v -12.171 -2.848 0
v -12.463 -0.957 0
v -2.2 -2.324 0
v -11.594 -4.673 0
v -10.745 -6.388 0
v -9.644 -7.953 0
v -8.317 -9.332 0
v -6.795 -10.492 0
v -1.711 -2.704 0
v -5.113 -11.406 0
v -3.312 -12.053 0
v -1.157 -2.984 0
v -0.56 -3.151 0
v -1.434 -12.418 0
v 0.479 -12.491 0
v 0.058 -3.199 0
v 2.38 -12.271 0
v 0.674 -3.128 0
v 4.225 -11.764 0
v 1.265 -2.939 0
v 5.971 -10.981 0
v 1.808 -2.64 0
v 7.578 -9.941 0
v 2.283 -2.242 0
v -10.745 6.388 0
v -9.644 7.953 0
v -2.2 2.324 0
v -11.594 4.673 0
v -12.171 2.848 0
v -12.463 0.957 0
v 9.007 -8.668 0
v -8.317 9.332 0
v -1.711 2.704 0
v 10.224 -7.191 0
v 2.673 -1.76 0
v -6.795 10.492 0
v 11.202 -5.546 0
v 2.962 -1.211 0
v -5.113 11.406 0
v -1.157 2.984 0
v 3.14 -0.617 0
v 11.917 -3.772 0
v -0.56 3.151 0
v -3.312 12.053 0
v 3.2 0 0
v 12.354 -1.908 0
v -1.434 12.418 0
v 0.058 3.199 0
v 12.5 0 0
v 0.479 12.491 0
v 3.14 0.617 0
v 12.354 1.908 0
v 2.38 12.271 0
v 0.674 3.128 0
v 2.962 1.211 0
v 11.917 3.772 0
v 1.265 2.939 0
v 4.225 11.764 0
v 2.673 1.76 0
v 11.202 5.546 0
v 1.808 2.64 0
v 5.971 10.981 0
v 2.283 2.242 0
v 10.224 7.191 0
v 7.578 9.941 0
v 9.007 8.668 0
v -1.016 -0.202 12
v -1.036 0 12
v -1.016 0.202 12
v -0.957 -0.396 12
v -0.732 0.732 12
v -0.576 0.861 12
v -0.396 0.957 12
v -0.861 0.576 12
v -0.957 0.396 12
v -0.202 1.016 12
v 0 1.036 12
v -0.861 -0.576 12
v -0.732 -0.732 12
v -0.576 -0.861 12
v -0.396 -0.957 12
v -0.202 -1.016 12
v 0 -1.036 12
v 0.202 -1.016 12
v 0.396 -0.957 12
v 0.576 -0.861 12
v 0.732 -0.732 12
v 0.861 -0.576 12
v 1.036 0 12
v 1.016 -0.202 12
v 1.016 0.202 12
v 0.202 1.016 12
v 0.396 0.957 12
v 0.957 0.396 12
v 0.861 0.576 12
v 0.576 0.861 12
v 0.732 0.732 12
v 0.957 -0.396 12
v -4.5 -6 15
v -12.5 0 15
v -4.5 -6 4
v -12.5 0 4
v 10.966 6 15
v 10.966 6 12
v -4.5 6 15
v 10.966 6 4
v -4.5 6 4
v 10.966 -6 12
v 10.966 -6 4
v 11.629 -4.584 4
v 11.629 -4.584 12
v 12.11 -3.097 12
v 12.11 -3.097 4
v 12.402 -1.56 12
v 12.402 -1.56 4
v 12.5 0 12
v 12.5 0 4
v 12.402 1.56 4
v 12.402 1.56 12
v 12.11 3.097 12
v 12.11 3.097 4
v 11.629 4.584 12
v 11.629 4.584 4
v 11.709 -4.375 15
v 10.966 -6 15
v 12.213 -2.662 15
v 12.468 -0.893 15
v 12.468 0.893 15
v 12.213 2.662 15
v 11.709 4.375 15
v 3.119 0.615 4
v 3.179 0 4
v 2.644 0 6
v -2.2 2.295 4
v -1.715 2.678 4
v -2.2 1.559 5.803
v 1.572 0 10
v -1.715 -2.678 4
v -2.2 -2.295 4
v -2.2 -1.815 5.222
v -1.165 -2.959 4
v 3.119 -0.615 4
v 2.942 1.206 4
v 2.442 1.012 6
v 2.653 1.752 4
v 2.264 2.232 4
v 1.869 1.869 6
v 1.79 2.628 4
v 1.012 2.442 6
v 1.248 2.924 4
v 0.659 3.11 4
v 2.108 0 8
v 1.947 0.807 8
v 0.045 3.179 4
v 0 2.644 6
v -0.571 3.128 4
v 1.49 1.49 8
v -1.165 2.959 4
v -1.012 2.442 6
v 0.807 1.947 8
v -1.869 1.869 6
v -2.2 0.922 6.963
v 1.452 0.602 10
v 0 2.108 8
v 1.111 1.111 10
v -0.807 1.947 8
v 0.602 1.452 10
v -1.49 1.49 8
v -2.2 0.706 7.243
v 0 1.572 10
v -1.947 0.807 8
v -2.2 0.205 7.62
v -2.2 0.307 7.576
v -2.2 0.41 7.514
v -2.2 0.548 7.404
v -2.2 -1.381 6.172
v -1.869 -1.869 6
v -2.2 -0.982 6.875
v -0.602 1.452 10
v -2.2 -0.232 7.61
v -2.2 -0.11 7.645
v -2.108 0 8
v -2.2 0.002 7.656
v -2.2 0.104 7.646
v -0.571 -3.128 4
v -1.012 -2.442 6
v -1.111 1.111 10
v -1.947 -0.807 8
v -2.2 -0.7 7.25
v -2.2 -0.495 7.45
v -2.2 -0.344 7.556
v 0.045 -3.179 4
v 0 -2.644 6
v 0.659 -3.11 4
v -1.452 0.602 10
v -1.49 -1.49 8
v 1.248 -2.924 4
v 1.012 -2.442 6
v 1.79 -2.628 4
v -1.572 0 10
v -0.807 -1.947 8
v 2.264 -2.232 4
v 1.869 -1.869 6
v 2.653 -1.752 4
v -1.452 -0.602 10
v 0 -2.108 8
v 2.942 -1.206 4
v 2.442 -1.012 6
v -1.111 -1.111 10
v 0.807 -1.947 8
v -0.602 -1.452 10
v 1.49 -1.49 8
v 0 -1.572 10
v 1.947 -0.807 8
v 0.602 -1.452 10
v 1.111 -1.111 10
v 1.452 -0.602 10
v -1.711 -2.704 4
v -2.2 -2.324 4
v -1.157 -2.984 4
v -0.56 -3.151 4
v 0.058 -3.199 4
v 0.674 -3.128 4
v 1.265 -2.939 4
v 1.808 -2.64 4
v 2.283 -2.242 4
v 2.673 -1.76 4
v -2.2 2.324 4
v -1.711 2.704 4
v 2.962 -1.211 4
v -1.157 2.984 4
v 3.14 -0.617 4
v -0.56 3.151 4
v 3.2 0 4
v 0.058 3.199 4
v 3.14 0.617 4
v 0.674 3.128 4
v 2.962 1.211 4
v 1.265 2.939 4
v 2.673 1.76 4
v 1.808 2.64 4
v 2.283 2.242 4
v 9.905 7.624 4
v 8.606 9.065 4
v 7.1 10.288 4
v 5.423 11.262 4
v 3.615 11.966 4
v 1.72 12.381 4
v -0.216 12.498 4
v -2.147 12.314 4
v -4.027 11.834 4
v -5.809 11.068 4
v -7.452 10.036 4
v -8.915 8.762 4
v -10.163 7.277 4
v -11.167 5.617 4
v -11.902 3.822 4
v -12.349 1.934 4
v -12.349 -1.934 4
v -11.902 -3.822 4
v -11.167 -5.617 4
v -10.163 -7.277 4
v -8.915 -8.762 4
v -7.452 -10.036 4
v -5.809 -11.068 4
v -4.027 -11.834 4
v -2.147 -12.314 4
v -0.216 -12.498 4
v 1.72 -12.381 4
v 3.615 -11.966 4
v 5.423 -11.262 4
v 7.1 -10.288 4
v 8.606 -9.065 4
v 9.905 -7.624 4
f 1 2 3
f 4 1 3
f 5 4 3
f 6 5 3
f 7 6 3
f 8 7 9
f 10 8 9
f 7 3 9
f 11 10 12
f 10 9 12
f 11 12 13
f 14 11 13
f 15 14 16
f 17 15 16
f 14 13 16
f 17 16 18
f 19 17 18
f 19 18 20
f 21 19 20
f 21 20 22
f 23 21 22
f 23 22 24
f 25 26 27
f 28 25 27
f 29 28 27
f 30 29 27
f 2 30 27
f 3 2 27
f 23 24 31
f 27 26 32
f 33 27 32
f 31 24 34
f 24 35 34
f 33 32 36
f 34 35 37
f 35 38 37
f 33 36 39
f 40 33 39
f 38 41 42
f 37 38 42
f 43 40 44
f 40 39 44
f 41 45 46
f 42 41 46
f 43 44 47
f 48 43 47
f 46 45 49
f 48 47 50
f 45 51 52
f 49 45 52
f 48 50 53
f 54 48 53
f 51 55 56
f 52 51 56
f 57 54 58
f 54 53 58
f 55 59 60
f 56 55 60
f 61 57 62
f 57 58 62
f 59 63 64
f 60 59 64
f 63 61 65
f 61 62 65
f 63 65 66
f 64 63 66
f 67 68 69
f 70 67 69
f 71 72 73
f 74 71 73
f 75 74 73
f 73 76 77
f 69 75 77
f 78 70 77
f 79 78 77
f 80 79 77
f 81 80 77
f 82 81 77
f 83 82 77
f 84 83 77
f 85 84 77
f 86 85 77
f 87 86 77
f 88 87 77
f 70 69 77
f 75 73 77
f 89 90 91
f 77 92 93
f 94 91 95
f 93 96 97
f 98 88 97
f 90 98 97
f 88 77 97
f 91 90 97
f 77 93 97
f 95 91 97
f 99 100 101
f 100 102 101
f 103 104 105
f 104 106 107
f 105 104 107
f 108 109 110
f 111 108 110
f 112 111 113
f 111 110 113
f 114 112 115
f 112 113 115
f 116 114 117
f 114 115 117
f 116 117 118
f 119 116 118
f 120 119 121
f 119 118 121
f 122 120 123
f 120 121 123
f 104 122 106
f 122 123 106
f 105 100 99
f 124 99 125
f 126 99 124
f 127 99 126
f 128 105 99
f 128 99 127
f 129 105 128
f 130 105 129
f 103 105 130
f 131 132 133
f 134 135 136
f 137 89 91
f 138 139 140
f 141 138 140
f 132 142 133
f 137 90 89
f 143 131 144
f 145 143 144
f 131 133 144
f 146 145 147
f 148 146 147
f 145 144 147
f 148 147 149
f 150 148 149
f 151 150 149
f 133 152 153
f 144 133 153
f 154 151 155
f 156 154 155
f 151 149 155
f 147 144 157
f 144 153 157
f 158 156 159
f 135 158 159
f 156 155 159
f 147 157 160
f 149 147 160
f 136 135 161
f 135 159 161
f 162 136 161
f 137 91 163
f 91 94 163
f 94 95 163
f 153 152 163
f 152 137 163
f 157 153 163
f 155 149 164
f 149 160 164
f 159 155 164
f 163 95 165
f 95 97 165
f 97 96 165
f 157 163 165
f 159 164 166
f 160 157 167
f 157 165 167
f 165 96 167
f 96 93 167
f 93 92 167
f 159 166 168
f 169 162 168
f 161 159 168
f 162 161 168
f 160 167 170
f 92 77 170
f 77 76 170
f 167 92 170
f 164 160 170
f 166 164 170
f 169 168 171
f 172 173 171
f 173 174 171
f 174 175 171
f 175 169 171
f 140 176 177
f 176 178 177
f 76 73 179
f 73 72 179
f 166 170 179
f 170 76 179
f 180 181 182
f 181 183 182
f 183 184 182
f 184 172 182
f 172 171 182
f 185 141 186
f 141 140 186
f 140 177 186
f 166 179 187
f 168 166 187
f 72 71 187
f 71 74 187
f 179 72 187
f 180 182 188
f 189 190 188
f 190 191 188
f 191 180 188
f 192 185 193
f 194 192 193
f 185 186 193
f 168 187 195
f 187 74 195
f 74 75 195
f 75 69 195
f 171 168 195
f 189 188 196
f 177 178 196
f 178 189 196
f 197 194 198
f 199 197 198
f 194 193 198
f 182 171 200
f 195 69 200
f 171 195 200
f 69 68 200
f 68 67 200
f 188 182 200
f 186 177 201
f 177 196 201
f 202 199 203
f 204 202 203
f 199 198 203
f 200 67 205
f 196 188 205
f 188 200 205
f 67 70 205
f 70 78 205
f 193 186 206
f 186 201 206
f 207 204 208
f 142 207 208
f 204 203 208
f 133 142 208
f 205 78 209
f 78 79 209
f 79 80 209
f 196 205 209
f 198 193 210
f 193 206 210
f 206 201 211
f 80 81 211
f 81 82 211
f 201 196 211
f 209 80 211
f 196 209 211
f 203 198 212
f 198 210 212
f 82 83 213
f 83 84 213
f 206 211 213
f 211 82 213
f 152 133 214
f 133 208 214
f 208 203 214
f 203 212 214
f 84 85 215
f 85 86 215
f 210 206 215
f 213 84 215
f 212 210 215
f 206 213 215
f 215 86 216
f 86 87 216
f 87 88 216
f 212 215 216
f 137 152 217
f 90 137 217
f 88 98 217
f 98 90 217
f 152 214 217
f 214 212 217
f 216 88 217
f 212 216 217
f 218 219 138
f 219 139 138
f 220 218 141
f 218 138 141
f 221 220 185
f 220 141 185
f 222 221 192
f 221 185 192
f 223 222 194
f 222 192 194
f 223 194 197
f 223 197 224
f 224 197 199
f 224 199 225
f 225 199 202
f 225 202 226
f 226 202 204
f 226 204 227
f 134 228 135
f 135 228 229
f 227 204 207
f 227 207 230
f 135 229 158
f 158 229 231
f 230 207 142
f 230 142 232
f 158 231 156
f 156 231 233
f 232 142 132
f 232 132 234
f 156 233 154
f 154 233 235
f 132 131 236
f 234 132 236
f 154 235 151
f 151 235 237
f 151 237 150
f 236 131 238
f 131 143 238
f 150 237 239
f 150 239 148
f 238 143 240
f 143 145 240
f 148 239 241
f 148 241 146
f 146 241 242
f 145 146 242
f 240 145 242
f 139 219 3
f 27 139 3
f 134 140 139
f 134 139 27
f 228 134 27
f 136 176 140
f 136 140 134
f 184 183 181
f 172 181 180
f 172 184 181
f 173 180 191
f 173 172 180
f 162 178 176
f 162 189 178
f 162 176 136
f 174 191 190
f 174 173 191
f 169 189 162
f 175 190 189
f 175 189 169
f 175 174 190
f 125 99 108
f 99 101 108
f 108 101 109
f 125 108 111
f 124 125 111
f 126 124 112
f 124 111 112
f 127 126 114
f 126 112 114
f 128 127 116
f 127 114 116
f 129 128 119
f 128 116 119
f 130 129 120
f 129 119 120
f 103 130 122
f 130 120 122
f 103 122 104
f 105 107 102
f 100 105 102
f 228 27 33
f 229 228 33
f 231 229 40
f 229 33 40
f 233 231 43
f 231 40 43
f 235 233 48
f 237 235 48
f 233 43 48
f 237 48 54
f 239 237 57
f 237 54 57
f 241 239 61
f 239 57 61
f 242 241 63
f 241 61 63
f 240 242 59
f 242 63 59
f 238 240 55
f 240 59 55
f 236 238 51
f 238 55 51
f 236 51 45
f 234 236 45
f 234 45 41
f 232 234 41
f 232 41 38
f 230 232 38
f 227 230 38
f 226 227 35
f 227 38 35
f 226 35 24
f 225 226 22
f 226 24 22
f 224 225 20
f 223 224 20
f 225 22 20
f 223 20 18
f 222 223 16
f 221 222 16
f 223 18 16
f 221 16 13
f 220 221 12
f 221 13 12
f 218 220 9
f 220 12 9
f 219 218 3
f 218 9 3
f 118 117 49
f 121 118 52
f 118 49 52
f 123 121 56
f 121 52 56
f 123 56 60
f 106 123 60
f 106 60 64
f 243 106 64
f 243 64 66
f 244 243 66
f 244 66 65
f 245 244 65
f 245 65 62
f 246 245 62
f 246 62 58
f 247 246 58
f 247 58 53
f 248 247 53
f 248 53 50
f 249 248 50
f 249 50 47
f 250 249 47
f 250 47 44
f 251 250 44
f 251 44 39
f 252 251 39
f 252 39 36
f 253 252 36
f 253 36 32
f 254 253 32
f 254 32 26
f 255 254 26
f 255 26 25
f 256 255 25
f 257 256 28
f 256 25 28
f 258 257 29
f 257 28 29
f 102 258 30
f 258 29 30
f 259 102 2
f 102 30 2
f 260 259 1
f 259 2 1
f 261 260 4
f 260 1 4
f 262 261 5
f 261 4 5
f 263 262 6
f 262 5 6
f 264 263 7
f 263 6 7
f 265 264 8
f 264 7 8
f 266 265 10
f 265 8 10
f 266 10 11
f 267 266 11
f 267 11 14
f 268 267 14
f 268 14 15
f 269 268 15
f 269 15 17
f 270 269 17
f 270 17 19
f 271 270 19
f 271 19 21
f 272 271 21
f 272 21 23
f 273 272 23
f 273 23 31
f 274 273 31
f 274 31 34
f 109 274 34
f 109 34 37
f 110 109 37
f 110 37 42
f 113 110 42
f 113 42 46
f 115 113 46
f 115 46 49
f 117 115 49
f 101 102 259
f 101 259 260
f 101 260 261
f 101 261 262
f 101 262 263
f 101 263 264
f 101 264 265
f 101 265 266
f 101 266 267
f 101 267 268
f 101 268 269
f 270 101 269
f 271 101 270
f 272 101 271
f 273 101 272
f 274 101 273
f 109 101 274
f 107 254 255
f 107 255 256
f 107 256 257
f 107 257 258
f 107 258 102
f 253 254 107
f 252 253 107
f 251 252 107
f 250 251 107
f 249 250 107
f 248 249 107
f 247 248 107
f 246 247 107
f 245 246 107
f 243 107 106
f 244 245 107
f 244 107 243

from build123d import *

# Parameters (mm, degrees)
F0_R     = 12.5
F1_DEPTH = 4
F2_R     = 0.5
F3_DEPTH = 8
F6_DEPTH = 3


# Not quite as in the source:
# - a fillet or chamfer that OpenCascade refuses, or shapes differently, is made with other operations: its cross-section is extruded or revolved along the edge and cut away or added


with BuildPart() as f1:
    # F0 (on Top) → F1 (new body)
    with BuildSketch(Plane.XY):
        Circle(F0_R)
        with BuildLine():
            Line((-2.2, -2.3237900077), (-2.2, 2.3237900077))
            ThreePointArc((-2.2, 2.3237900077), (3.2, 0), (-2.2, -2.3237900077))
        make_face(mode=Mode.SUBTRACT)
    extrude(amount=F1_DEPTH)

    # F2 (on face) → F3 (join)
    with BuildSketch(Plane.XY.offset(4)):
        with BuildLine():
            Line((-4.5, 6), (-12.5, 0))
            Line((-12.5, 0), (-4.5, -6))
            Line((-4.5, -6), (10.9658560997, -6))
            ThreePointArc((10.9658560997, -6), (12.1103922572, -3.0965140685), (12.5, 0))
            ThreePointArc((12.5, 0), (12.1103922572, 3.0965140685), (10.9658560997, 6))
            Line((10.9658560997, 6), (-4.5, 6))
        make_face()
        Circle(F2_R, mode=Mode.SUBTRACT)
    extrude(amount=F3_DEPTH)

    # F4: chamfer of 10 x 2.6794919243 on 1 edges, made by hand


with BuildPart() as f4_tool2:
    # F4_s3 → F4_t4 (revolve)
    with BuildSketch(Plane.XZ):
        Polygon((3.1794919243, 4), (0.5, 14), (0.5, 4), align=None)
    revolve(axis=Axis((0, 0, 4), (0, 0, 1)))

    split(bisect_by=Plane.YZ.offset(-2.2), keep=Keep.TOP)


with BuildPart() as f1_1:
    add(f1.part)

    # F4_t1: cut F4_tool2
    add(f4_tool2.part, mode=Mode.SUBTRACT)

    # F5 (on face) → F6 (join)
    with BuildSketch(Plane.XY.offset(12)):
        with BuildLine():
            Line((-4.5, 6), (-12.5, 0))
            Line((-12.5, 0), (-4.5, -6))
            Line((-4.5, -6), (10.9658560997, -6))
            ThreePointArc((10.9658560997, -6), (12.5, 0), (10.9658560997, 6))
            Line((10.9658560997, 6), (-4.5, 6))
        make_face()
    extrude(amount=F6_DEPTH)


solid = f1_1.part
